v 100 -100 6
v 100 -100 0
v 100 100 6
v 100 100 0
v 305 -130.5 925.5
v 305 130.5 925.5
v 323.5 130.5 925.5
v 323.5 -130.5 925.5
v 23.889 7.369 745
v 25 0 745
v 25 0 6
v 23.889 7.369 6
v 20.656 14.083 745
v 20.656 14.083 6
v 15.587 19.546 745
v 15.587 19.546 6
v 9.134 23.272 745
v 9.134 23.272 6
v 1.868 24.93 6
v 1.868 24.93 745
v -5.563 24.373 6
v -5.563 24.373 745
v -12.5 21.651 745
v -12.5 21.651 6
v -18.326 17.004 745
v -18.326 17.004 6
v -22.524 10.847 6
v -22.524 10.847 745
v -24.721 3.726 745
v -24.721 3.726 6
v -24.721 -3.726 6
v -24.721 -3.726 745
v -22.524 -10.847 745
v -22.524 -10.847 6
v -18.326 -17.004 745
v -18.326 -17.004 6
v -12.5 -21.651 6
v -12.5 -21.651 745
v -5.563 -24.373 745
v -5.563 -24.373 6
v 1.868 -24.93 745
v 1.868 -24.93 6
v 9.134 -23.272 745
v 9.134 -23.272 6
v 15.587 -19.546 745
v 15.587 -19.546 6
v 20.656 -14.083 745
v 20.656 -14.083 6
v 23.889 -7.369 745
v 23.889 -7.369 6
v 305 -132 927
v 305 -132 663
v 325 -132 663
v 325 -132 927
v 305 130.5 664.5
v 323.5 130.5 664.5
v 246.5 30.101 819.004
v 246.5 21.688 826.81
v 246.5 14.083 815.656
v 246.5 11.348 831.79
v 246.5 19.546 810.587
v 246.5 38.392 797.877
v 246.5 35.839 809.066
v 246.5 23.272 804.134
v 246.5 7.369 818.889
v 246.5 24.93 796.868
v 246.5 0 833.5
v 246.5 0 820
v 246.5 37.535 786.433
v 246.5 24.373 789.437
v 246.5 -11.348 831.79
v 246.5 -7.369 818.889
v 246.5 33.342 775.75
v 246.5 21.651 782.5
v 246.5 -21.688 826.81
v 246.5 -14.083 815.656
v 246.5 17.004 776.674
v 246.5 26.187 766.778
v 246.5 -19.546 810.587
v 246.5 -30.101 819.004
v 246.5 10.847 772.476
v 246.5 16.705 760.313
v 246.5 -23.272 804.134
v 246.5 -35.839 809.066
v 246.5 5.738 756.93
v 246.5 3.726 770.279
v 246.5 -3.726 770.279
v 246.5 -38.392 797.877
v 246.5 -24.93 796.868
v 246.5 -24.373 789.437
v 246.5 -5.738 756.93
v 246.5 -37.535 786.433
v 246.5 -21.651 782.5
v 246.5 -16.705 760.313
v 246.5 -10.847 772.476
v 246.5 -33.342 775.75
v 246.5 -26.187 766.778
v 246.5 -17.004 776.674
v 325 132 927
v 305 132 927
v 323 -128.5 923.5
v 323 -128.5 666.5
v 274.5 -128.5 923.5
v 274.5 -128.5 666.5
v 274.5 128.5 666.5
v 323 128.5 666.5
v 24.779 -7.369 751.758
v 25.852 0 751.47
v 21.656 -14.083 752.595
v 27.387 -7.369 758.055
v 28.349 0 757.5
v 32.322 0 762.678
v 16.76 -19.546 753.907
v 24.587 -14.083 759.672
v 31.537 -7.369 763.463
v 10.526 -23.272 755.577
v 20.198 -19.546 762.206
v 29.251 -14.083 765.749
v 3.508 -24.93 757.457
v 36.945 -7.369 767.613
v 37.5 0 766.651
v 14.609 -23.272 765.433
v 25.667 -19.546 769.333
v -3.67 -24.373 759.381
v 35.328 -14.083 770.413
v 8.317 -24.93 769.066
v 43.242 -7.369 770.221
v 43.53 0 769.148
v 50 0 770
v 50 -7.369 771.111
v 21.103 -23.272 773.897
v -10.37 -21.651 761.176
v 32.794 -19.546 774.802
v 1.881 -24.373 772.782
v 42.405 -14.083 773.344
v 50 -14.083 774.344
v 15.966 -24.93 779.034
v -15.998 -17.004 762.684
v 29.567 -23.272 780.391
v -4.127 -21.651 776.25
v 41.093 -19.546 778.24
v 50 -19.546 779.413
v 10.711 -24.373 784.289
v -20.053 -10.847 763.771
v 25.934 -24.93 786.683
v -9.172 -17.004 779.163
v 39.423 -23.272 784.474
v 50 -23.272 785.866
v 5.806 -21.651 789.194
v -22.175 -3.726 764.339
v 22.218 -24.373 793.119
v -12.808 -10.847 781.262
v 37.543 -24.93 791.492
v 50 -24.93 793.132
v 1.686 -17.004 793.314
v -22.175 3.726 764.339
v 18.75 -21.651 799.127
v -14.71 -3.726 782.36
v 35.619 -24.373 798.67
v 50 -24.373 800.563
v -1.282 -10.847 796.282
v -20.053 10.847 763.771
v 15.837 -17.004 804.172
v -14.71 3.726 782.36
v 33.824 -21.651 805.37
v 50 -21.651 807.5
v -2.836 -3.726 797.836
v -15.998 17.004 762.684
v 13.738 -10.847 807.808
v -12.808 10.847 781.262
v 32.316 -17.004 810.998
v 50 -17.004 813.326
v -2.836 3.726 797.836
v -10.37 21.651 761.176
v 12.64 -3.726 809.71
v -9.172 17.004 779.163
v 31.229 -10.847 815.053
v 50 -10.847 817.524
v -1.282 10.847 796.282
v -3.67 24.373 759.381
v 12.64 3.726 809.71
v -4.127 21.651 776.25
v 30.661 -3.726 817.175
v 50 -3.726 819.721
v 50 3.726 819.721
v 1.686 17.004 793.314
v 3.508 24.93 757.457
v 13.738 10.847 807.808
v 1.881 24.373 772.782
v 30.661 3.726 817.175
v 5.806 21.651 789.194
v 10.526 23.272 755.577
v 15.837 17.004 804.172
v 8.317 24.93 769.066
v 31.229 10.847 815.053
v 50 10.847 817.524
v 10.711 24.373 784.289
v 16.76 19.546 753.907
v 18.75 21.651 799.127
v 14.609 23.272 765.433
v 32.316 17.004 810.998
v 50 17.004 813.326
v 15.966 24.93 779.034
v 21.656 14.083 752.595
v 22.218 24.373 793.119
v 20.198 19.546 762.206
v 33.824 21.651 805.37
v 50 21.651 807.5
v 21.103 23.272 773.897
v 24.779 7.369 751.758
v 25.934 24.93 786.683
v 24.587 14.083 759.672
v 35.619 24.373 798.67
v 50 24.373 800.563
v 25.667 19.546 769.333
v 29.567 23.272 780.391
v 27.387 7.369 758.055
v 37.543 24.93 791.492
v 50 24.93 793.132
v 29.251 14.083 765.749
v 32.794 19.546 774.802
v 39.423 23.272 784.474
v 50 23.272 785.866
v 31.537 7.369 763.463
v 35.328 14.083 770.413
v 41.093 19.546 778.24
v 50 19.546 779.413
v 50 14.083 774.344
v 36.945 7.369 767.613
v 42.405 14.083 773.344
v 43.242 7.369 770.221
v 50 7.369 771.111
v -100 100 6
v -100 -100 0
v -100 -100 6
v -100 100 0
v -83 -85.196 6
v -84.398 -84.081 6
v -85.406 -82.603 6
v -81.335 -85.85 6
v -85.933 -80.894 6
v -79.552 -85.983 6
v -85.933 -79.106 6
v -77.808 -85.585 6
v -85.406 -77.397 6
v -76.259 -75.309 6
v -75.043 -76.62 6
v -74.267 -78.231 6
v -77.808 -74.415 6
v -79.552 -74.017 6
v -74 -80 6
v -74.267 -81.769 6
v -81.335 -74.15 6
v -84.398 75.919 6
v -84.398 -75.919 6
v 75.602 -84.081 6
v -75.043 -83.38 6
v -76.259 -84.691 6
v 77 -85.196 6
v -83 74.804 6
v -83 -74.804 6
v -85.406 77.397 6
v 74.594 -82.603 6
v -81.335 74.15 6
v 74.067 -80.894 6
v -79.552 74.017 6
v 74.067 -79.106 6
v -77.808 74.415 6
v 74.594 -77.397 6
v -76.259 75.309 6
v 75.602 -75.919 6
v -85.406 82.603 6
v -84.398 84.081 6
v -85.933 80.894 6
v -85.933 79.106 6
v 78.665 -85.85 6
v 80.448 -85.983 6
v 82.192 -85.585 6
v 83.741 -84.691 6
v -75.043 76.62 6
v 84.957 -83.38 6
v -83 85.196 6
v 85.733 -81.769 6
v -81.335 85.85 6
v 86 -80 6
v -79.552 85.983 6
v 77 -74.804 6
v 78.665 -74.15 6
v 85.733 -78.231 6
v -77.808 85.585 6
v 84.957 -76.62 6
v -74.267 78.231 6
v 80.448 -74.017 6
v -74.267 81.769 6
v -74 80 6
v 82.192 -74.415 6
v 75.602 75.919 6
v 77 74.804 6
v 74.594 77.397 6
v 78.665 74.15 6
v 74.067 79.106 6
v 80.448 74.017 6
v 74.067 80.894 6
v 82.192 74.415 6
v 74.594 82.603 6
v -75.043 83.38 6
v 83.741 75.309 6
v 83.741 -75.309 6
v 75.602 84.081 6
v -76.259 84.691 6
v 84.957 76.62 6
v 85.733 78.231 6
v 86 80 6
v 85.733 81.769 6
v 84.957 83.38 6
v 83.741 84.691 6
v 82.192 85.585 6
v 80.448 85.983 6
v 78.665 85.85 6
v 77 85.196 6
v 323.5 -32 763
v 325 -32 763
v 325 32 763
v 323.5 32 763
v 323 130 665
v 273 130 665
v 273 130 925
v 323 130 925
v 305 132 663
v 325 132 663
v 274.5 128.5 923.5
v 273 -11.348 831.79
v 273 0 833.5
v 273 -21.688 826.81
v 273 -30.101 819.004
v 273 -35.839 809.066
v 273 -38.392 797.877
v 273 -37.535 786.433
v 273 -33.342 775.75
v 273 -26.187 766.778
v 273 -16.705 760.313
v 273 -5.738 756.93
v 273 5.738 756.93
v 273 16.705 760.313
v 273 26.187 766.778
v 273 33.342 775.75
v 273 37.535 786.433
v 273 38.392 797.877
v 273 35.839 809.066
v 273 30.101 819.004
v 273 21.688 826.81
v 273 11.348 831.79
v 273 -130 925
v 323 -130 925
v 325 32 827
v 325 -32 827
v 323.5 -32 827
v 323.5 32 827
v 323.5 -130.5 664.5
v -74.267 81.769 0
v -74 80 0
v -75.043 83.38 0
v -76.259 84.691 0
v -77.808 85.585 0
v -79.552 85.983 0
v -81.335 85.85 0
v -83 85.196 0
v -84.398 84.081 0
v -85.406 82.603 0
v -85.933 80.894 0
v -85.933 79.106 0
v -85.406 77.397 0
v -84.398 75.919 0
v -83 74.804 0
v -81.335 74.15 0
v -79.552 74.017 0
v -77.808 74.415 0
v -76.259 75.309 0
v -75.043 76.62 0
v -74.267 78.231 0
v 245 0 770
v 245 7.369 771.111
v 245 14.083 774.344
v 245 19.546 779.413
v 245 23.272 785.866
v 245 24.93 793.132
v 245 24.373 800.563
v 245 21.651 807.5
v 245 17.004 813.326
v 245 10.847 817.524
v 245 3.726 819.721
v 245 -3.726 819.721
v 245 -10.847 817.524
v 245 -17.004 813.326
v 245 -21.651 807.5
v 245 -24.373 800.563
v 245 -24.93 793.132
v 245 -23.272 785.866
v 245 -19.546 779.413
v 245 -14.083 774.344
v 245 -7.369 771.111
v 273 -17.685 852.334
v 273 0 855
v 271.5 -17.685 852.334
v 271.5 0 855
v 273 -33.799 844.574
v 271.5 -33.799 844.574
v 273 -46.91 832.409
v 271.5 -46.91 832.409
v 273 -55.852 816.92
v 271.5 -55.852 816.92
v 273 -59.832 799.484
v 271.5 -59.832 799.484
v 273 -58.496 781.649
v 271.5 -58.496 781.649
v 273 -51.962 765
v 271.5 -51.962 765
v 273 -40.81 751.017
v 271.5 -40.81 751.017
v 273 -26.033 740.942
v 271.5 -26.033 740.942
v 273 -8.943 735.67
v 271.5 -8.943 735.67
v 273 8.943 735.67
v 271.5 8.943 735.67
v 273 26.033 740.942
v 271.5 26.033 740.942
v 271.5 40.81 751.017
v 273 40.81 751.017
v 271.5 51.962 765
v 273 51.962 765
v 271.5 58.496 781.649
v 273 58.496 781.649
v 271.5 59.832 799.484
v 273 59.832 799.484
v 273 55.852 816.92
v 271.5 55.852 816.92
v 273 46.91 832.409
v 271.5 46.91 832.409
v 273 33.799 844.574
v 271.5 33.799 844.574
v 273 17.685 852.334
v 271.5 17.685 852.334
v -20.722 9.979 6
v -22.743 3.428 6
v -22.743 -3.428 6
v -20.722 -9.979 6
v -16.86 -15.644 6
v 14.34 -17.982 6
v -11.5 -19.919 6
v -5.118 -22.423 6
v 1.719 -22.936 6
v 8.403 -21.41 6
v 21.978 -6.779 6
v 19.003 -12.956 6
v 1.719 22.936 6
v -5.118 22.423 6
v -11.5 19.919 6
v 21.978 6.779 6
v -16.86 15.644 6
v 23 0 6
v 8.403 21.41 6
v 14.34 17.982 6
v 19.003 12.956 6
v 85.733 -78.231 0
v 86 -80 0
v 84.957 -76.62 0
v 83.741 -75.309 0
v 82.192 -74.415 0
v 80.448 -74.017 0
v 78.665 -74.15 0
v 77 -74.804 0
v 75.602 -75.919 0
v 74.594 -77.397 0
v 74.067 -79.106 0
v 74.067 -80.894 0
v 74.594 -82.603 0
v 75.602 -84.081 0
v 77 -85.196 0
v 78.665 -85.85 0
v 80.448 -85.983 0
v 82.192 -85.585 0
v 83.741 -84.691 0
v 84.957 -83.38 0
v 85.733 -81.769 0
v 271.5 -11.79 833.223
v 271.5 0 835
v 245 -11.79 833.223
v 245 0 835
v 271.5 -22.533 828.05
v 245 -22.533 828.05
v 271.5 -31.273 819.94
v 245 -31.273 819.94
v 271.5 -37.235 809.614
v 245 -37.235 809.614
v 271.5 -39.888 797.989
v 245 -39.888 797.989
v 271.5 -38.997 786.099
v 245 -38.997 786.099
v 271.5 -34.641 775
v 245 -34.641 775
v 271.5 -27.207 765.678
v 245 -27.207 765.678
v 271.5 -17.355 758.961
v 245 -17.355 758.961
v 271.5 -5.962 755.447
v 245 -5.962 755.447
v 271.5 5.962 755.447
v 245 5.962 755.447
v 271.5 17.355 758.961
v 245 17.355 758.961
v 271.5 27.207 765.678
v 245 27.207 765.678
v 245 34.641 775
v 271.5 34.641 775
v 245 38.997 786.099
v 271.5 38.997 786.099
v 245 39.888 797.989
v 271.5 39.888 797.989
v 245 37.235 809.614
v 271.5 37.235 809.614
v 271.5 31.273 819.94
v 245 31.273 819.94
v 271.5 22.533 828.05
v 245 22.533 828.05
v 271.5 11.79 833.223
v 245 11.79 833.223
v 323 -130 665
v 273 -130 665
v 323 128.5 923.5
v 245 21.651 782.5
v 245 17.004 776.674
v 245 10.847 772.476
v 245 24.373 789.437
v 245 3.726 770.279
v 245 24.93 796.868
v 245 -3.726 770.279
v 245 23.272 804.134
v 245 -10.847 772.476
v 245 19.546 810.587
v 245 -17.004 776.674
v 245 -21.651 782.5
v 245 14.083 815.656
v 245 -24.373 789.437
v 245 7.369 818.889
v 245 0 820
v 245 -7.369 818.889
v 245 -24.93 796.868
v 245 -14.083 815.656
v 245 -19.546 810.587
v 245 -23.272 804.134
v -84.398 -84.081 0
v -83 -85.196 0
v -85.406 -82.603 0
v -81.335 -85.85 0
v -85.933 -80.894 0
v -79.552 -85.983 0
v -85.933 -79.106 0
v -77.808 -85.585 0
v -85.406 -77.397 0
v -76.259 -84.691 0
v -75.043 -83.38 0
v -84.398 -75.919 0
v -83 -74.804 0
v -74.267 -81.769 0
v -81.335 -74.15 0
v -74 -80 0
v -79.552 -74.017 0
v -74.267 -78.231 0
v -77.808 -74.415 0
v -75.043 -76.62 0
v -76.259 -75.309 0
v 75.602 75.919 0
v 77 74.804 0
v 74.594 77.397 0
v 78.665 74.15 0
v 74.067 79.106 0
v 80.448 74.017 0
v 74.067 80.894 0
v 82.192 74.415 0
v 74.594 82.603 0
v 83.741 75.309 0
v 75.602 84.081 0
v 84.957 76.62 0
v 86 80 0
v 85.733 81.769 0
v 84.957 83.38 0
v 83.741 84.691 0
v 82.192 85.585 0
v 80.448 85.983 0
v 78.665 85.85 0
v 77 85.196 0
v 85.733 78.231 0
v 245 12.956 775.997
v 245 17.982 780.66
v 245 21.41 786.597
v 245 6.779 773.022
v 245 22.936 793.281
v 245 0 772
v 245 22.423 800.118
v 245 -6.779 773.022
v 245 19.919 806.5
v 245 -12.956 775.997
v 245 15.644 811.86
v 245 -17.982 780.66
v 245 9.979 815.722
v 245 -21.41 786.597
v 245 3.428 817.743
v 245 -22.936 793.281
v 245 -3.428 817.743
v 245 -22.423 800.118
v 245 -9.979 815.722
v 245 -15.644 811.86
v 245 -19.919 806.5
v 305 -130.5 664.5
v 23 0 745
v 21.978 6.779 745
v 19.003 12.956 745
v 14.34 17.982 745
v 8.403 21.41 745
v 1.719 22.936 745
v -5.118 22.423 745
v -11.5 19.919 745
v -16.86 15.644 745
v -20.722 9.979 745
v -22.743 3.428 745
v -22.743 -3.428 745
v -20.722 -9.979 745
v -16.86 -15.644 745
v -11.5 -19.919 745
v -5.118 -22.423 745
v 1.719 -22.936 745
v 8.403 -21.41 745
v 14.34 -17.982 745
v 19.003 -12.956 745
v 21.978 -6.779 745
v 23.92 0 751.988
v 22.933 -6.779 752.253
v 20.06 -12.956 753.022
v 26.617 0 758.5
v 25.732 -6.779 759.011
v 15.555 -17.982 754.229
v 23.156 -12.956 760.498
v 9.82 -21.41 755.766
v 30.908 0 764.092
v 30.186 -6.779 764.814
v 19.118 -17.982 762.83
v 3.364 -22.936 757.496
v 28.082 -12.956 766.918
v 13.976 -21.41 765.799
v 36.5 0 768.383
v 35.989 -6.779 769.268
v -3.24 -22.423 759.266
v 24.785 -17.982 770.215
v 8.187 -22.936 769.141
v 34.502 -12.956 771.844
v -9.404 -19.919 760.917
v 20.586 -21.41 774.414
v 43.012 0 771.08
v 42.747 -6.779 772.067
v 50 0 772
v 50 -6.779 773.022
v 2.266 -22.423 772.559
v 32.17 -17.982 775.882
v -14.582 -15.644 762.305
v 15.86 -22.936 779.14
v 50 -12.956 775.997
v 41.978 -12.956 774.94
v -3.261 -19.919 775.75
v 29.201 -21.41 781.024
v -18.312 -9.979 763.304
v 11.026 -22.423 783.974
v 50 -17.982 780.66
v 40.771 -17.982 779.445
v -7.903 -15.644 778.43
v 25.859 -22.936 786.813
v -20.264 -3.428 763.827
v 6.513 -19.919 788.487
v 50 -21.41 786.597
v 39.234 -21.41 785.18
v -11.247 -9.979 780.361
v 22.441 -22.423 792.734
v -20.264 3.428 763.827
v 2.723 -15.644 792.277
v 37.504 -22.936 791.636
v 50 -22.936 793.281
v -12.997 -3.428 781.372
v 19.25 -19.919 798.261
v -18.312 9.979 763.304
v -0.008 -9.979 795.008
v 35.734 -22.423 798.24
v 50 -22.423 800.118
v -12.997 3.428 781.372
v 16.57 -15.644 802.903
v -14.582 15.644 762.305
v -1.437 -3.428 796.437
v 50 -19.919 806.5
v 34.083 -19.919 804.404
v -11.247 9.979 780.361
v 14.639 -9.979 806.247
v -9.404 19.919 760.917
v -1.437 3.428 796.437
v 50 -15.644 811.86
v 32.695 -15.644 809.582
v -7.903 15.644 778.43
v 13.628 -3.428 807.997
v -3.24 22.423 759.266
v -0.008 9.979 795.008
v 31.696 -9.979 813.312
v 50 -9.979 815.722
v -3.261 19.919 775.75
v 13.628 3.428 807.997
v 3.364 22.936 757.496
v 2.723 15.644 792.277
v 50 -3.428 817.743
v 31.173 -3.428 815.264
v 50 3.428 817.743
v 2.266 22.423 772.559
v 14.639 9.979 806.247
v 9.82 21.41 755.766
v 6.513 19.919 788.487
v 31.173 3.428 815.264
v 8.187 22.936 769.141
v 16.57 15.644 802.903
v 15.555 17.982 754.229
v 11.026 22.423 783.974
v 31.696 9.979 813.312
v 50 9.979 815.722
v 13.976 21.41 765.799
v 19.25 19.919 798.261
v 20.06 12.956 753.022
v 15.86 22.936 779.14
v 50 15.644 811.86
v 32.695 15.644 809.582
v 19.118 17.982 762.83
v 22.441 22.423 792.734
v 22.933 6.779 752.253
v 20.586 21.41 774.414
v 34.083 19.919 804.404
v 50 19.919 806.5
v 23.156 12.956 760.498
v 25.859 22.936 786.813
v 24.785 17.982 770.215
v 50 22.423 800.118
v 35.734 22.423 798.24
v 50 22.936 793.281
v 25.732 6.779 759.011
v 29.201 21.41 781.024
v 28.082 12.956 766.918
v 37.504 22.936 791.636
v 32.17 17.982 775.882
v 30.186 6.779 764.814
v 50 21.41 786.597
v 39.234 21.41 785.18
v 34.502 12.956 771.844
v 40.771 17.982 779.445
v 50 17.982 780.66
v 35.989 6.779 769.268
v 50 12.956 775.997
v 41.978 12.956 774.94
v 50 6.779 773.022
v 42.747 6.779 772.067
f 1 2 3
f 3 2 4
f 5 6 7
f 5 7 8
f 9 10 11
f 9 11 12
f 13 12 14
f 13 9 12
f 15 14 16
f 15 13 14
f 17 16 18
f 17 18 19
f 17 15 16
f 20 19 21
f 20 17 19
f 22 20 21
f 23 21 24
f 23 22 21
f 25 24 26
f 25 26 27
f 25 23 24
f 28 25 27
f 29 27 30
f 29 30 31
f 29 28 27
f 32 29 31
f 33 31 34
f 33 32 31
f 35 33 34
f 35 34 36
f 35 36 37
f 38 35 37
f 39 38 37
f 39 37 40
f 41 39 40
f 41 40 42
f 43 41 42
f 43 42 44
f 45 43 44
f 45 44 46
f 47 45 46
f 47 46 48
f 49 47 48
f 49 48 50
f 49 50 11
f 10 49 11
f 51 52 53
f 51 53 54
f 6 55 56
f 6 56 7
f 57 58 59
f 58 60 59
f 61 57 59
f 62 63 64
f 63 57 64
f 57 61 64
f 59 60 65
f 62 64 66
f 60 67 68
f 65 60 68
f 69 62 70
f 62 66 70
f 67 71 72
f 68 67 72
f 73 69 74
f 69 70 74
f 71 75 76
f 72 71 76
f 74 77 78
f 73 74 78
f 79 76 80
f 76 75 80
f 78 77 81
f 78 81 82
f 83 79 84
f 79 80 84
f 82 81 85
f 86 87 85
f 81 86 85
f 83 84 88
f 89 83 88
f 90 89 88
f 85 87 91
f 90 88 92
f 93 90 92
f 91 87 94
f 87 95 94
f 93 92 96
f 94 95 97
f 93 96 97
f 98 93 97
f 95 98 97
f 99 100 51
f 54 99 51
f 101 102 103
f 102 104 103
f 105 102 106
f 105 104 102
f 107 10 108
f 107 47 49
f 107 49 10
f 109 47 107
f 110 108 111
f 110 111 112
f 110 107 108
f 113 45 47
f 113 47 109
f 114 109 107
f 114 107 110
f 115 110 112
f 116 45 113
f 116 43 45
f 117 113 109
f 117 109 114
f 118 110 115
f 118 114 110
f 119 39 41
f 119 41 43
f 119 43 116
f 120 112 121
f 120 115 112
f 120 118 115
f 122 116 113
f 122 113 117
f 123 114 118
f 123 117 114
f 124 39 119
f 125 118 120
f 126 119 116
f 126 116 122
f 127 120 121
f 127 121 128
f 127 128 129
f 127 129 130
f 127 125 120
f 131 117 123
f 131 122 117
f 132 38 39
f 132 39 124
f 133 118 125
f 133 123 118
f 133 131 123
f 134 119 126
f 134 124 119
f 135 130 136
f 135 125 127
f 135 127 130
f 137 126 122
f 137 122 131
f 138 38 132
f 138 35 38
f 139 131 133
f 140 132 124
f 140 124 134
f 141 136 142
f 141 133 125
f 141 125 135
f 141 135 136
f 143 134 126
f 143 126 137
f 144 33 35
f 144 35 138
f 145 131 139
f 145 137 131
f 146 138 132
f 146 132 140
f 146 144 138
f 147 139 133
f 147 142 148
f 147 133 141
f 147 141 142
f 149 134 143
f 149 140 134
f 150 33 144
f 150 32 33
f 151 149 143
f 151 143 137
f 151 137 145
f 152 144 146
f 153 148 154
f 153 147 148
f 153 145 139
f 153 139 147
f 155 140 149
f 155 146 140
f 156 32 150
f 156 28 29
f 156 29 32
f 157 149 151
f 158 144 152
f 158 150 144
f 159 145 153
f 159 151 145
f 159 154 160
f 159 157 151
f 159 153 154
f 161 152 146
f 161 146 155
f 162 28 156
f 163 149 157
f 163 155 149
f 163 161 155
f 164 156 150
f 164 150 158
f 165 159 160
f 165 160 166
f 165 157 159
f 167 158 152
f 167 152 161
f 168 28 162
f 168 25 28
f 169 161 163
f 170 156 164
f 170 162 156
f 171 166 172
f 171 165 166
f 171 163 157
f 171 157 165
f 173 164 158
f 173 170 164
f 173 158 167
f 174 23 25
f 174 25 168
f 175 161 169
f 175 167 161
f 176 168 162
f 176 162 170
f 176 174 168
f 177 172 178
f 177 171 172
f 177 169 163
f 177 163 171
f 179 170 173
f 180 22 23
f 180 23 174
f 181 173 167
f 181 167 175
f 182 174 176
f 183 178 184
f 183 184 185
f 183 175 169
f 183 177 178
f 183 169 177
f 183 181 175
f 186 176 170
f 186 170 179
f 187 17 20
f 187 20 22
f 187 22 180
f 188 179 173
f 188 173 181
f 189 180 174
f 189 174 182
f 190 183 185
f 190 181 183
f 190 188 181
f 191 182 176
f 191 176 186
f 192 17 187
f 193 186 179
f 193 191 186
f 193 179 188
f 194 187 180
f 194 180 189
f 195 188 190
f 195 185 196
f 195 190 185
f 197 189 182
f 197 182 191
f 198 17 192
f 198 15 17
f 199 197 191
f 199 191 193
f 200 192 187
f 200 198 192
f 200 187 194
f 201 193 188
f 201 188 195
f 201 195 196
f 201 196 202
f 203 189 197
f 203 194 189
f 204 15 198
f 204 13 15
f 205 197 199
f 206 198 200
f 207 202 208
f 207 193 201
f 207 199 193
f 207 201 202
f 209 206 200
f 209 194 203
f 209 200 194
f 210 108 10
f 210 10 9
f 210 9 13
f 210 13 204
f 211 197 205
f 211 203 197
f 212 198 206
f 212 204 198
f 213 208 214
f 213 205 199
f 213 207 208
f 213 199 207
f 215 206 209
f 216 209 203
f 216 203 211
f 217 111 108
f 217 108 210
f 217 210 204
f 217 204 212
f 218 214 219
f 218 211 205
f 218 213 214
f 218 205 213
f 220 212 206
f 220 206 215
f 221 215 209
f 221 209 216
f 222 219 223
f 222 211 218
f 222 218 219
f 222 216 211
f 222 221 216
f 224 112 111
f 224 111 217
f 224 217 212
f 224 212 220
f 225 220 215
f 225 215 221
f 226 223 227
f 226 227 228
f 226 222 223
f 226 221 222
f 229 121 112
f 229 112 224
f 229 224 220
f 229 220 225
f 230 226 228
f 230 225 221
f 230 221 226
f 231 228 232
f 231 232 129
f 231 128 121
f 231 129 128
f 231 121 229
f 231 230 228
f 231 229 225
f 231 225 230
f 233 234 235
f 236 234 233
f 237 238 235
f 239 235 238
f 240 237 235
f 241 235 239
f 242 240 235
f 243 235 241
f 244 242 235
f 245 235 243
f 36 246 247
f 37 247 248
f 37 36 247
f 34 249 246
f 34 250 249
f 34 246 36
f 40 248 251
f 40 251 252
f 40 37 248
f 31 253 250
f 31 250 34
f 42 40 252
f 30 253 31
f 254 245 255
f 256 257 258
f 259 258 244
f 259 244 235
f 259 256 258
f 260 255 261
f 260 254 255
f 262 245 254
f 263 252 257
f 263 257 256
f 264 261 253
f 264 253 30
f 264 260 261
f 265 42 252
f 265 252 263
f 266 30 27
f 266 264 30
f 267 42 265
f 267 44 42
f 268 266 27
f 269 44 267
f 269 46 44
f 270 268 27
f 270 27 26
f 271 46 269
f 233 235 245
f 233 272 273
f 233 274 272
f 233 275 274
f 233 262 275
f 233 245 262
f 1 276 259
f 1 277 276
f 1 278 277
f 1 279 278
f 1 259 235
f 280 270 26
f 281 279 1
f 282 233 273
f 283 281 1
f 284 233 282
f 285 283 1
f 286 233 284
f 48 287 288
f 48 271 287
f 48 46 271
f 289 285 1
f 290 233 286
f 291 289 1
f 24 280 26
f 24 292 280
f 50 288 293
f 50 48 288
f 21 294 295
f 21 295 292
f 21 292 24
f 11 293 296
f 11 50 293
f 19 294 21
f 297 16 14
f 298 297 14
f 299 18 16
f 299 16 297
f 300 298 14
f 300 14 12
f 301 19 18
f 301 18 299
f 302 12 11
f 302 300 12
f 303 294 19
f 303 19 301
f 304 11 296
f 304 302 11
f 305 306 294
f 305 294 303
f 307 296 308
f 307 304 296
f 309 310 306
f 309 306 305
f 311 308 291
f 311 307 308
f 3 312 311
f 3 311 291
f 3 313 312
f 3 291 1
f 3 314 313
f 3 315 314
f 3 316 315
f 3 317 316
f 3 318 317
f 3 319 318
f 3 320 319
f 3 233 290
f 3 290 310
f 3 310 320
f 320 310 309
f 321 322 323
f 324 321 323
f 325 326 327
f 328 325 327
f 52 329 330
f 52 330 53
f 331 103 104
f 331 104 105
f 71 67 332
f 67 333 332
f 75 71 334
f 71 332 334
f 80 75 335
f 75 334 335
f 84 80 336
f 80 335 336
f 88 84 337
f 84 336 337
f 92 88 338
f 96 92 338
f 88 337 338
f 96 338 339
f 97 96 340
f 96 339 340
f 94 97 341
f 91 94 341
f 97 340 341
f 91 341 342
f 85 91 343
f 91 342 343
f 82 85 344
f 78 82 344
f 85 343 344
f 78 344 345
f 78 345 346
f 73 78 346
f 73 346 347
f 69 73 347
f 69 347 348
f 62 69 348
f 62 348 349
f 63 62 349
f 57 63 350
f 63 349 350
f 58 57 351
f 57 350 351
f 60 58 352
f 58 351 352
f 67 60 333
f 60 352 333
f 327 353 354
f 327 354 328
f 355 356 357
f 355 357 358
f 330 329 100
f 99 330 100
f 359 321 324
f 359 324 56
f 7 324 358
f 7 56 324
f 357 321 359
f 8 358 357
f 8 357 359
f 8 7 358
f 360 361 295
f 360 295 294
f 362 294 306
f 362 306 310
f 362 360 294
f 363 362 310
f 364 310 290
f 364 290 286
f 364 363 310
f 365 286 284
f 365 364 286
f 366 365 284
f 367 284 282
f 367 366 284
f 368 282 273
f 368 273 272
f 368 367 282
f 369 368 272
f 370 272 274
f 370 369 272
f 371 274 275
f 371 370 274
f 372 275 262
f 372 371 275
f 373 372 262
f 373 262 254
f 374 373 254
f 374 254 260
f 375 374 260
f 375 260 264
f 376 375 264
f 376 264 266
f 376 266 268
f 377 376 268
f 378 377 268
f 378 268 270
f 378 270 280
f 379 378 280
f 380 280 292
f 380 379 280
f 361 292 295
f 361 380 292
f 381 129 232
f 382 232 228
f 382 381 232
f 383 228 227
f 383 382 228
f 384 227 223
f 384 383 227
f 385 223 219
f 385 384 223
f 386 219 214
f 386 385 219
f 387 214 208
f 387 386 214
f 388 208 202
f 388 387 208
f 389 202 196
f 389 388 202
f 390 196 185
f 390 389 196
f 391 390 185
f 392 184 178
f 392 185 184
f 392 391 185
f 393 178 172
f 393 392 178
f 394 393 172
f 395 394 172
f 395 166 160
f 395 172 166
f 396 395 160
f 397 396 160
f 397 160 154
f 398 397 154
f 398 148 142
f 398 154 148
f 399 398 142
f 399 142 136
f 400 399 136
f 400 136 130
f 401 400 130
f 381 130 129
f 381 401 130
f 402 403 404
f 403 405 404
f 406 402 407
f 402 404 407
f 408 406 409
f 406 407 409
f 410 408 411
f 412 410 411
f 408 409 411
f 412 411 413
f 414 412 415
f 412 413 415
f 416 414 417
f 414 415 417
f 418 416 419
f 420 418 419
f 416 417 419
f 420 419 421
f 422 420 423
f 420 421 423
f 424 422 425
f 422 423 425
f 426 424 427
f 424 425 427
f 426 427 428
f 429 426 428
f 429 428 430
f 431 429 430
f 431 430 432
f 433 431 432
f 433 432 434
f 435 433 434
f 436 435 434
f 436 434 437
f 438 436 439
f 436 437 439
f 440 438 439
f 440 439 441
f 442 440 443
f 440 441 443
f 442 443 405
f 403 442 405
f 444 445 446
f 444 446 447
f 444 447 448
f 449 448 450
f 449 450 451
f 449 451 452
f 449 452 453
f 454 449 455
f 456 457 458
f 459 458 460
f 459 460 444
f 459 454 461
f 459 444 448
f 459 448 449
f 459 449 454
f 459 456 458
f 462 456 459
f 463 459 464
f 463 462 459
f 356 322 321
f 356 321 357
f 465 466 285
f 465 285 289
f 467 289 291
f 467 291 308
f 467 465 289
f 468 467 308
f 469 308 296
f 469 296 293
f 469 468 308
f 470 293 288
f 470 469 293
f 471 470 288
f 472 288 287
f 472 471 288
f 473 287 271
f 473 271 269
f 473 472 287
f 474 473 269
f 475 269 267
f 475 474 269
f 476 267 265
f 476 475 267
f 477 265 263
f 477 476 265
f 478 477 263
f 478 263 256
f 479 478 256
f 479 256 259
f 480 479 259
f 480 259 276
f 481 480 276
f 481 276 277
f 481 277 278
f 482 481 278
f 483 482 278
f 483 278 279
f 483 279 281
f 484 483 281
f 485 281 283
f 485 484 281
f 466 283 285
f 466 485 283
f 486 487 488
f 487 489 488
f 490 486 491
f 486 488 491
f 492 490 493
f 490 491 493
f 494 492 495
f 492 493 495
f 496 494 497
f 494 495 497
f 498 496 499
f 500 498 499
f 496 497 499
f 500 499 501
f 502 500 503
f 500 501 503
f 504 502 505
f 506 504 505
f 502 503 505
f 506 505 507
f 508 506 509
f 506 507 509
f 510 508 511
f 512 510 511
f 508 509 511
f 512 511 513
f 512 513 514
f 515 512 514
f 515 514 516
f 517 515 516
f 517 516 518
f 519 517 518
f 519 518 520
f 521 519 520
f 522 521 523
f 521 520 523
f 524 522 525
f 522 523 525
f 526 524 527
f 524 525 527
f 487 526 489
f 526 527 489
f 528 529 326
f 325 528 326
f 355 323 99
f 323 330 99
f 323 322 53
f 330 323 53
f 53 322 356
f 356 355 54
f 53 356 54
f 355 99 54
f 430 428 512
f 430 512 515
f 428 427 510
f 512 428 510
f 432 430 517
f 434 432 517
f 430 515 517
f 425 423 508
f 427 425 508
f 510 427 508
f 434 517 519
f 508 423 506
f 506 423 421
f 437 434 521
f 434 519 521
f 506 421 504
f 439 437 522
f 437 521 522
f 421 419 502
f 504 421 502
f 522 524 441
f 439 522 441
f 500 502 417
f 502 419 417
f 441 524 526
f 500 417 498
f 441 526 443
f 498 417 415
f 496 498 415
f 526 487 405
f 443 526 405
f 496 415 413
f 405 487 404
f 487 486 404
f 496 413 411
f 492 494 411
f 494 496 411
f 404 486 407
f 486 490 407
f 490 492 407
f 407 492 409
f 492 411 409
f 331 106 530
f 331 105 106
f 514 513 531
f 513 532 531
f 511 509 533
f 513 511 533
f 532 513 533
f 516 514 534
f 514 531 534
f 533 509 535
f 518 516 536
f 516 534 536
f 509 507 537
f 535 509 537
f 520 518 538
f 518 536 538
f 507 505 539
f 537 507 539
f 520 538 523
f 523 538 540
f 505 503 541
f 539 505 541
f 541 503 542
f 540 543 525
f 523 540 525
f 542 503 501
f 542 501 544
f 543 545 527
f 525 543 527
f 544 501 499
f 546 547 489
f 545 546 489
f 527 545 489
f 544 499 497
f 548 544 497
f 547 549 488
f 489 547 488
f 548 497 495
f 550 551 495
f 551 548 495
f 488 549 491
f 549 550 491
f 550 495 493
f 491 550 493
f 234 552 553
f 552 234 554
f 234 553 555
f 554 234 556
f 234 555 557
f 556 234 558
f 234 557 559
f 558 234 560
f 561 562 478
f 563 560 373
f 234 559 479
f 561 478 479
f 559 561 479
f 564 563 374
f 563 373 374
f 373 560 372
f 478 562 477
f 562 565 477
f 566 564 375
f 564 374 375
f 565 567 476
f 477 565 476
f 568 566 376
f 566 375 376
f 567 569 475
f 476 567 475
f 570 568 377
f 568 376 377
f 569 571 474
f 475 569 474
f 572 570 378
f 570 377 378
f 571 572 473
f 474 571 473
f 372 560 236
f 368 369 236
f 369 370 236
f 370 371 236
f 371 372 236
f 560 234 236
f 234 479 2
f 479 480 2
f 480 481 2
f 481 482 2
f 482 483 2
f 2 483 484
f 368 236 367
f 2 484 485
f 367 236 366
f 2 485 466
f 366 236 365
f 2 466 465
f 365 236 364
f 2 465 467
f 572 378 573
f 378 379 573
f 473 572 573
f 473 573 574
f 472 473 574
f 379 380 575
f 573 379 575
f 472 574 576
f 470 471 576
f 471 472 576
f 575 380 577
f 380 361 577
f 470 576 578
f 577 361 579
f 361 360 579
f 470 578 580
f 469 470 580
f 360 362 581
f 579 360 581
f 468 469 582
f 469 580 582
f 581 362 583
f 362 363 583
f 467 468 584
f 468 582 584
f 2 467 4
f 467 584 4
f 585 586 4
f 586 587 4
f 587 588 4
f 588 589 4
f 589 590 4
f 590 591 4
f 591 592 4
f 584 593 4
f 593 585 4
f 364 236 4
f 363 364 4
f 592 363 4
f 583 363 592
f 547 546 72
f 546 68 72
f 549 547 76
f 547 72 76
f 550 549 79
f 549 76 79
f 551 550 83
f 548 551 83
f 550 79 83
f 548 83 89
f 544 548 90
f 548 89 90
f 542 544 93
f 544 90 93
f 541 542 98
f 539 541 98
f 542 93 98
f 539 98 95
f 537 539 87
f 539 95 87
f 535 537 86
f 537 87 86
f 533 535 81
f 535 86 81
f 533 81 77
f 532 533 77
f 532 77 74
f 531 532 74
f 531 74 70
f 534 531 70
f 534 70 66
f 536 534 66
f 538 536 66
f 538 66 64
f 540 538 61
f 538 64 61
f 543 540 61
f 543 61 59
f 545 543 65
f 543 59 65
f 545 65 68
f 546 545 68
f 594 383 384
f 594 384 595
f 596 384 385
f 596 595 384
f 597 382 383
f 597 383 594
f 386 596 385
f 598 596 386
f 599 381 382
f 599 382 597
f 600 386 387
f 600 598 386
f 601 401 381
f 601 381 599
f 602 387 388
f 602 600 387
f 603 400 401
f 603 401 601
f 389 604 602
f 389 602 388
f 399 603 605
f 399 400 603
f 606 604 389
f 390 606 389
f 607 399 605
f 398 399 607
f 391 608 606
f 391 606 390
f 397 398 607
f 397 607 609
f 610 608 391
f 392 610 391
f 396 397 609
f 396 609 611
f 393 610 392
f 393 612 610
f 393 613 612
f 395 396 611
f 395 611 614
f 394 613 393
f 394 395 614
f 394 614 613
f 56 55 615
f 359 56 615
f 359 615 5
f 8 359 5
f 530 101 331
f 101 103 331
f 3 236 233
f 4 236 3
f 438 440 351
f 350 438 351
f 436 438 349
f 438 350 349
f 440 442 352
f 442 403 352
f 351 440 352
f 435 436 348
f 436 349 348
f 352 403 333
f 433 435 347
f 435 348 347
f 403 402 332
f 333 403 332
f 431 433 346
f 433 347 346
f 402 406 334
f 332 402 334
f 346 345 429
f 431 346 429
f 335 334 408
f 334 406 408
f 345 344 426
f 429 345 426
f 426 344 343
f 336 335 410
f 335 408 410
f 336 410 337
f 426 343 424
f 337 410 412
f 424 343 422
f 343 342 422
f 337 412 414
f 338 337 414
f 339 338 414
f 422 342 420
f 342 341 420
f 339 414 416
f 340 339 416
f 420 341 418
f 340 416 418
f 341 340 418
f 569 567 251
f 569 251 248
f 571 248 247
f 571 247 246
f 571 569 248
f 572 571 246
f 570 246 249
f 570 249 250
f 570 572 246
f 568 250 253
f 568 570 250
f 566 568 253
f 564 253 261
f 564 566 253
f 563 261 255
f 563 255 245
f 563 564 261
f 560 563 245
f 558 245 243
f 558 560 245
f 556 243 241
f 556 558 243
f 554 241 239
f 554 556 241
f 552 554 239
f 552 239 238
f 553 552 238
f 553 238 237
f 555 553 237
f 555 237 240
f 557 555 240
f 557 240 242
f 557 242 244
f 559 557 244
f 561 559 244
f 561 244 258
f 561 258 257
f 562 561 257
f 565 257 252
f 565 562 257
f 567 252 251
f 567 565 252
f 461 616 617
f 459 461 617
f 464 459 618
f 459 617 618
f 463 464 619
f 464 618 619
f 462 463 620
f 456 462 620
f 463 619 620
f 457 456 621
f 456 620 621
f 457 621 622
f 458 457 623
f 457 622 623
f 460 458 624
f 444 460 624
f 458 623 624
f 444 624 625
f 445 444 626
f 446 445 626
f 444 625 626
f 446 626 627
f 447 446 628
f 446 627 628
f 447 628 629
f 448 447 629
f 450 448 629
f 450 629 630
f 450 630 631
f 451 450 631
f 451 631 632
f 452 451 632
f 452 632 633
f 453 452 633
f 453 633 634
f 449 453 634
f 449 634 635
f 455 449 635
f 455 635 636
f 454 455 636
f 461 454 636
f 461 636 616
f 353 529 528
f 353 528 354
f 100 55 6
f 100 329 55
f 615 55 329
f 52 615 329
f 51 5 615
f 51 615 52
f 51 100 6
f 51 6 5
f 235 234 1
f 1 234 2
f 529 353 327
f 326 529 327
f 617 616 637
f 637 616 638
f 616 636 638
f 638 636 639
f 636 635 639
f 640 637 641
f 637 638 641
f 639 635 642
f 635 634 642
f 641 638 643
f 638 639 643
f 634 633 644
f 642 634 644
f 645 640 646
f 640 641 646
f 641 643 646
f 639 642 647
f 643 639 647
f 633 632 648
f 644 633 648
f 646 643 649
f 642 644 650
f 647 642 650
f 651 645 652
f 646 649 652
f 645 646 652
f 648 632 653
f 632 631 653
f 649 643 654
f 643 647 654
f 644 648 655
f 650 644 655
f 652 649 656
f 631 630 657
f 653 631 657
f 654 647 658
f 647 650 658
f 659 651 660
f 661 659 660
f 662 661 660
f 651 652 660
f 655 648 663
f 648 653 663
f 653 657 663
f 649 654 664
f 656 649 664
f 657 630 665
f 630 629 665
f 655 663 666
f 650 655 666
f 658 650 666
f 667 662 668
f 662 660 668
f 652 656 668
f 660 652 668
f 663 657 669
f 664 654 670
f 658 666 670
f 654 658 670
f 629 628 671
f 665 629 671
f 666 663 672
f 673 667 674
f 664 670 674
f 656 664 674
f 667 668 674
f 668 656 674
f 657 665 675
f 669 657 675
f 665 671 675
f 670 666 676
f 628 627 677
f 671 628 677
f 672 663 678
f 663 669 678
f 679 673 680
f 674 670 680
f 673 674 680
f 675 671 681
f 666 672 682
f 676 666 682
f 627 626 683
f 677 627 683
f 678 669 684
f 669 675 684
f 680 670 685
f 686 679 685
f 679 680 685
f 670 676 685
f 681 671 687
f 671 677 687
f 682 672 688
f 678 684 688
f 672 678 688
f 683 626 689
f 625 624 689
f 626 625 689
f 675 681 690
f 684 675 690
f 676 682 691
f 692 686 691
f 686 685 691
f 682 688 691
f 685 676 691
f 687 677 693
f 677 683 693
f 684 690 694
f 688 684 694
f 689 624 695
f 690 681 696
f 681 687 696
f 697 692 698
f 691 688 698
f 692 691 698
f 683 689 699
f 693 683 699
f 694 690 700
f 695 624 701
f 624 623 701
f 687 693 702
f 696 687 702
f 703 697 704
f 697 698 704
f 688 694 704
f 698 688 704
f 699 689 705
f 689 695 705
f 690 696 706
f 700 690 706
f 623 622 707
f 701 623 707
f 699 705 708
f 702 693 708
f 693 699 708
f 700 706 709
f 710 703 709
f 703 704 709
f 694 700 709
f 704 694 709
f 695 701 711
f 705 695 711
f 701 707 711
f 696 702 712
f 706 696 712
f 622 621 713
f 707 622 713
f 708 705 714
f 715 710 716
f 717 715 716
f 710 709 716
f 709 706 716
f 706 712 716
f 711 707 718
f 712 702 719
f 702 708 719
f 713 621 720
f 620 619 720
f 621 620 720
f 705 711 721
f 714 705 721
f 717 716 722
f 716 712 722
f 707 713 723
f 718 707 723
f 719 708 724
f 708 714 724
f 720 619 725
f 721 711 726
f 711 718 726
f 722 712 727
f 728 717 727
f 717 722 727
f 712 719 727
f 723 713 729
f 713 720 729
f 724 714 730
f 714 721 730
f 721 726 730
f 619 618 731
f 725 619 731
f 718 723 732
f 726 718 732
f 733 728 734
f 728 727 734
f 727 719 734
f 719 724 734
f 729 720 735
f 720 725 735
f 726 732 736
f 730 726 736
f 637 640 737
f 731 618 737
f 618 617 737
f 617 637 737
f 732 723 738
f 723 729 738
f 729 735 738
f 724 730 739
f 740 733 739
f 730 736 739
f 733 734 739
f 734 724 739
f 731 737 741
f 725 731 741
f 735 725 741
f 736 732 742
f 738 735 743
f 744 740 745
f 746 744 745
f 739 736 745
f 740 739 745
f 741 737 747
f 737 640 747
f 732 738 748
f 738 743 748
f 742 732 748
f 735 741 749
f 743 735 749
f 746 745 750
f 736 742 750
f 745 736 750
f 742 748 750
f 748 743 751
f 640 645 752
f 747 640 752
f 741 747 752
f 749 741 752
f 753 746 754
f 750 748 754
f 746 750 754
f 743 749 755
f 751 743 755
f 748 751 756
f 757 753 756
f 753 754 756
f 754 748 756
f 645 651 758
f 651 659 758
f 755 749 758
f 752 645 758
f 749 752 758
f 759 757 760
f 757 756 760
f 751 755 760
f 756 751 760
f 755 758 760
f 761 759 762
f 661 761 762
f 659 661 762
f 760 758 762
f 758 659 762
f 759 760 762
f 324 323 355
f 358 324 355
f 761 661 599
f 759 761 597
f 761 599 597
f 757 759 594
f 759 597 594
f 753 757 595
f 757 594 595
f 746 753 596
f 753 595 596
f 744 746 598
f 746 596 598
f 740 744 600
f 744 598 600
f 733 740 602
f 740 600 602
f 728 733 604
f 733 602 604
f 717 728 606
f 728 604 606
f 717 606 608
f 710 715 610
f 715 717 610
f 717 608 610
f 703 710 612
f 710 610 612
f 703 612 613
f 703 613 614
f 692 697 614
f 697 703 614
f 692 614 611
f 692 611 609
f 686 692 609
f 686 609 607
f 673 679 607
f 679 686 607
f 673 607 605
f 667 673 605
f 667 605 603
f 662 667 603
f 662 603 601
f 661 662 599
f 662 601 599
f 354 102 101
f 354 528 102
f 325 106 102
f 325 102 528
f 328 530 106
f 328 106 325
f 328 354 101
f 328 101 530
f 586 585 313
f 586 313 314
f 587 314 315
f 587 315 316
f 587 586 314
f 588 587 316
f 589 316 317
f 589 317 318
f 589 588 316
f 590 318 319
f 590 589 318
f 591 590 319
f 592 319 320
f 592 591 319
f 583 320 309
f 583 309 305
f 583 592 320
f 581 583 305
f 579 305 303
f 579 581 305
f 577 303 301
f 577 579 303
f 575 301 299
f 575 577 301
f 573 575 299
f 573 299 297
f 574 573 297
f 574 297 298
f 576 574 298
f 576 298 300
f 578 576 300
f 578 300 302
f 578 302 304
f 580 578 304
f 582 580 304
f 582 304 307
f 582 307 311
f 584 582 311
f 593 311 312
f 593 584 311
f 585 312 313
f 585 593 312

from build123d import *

# Parameters (mm, degrees)
F0_W      = 200
F0_H      = 200
F0_R      = 6
F1_DEPTH  = 6
F3_R      = 25
F3_R_2    = 23
F7_W      = 260
F7_H      = 260
F8_DEPTH  = 50
F9_T      = -1.5
F11_W     = 264
F11_H     = 264
F12_DEPTH = 20
F13_T     = -1.5
F14_W     = 64
F14_H     = 64
F15_DEPTH = 1.5


with BuildPart() as f1:
    # F0 (on Top) → F1 (new body)
    with BuildSketch(Plane.XY):
        Rectangle(F0_W, F0_H)
        with Locations((-80, -80)):
            Circle(F0_R, mode=Mode.SUBTRACT)
        with Locations((80, -80)):
            Circle(F0_R, mode=Mode.SUBTRACT)
        with Locations((-80, 80)):
            Circle(F0_R, mode=Mode.SUBTRACT)
        with Locations((80, 80)):
            Circle(F0_R, mode=Mode.SUBTRACT)
    extrude(amount=F1_DEPTH)

    # F4: sweep along a path in F2
    with BuildLine(Plane.XZ) as f4_path:
        Line((0, 6), (0, 745))
        ThreePointArc((0, 745), (14.6446609407, 780.3553390593), (50, 795))
        Line((50, 795), (245, 795))
    # F3 (on face) → F4 (sweep)
    with BuildSketch(Plane.XY.offset(6)):
        Circle(F3_R)
        Circle(F3_R_2, mode=Mode.SUBTRACT)
    sweep(path=f4_path.line)


with BuildPart() as f6:
    # F5 (on Front) → F6 (revolve)
    with BuildSketch(Plane.XZ):
        Polygon((245, 835), (245, 820), (246.5, 820), (246.5, 833.5), (273, 833.5), (273, 855), (271.5, 855), (271.5, 835), align=None)
    revolve(axis=Axis((270.696592927, 0, 795), (1, 0, 0)))


with BuildPart() as f8:
    # F7 (on face) → F8 (new body)
    with BuildSketch(Plane.YZ.offset(273)):
        with Locations((0, 795)):
            Rectangle(F7_W, F7_H)
    extrude(amount=F8_DEPTH)

    # F9
    f9_openings = [f8.faces().sort_by_distance(p)[0] for p in [
        (323, 0, 795),
    ]]
    offset(amount=F9_T, openings=f9_openings)


with BuildPart() as f12:
    # F11 (on offset) → F12 (new body)
    with BuildSketch(Plane(origin=(305, 0, 0), x_dir=(0, -1, 0), z_dir=(-1, 0, 0))):
        with Locations((0, 795)):
            Rectangle(F11_W, F11_H)
    extrude(amount=-F12_DEPTH)

    # F13
    f13_openings = [f12.faces().sort_by_distance(p)[0] for p in [
        (305, 0, 795),
    ]]
    offset(amount=F13_T, openings=f13_openings)

    # F14 (on face) → F15 (cut, through all)
    with BuildSketch(Plane.YZ.offset(325)):
        with Locations((0, 795)):
            Rectangle(F14_W, F14_H)
    extrude(amount=-F15_DEPTH, mode=Mode.SUBTRACT)


solid = Compound([f1.part, f6.part, f8.part, f12.part])
